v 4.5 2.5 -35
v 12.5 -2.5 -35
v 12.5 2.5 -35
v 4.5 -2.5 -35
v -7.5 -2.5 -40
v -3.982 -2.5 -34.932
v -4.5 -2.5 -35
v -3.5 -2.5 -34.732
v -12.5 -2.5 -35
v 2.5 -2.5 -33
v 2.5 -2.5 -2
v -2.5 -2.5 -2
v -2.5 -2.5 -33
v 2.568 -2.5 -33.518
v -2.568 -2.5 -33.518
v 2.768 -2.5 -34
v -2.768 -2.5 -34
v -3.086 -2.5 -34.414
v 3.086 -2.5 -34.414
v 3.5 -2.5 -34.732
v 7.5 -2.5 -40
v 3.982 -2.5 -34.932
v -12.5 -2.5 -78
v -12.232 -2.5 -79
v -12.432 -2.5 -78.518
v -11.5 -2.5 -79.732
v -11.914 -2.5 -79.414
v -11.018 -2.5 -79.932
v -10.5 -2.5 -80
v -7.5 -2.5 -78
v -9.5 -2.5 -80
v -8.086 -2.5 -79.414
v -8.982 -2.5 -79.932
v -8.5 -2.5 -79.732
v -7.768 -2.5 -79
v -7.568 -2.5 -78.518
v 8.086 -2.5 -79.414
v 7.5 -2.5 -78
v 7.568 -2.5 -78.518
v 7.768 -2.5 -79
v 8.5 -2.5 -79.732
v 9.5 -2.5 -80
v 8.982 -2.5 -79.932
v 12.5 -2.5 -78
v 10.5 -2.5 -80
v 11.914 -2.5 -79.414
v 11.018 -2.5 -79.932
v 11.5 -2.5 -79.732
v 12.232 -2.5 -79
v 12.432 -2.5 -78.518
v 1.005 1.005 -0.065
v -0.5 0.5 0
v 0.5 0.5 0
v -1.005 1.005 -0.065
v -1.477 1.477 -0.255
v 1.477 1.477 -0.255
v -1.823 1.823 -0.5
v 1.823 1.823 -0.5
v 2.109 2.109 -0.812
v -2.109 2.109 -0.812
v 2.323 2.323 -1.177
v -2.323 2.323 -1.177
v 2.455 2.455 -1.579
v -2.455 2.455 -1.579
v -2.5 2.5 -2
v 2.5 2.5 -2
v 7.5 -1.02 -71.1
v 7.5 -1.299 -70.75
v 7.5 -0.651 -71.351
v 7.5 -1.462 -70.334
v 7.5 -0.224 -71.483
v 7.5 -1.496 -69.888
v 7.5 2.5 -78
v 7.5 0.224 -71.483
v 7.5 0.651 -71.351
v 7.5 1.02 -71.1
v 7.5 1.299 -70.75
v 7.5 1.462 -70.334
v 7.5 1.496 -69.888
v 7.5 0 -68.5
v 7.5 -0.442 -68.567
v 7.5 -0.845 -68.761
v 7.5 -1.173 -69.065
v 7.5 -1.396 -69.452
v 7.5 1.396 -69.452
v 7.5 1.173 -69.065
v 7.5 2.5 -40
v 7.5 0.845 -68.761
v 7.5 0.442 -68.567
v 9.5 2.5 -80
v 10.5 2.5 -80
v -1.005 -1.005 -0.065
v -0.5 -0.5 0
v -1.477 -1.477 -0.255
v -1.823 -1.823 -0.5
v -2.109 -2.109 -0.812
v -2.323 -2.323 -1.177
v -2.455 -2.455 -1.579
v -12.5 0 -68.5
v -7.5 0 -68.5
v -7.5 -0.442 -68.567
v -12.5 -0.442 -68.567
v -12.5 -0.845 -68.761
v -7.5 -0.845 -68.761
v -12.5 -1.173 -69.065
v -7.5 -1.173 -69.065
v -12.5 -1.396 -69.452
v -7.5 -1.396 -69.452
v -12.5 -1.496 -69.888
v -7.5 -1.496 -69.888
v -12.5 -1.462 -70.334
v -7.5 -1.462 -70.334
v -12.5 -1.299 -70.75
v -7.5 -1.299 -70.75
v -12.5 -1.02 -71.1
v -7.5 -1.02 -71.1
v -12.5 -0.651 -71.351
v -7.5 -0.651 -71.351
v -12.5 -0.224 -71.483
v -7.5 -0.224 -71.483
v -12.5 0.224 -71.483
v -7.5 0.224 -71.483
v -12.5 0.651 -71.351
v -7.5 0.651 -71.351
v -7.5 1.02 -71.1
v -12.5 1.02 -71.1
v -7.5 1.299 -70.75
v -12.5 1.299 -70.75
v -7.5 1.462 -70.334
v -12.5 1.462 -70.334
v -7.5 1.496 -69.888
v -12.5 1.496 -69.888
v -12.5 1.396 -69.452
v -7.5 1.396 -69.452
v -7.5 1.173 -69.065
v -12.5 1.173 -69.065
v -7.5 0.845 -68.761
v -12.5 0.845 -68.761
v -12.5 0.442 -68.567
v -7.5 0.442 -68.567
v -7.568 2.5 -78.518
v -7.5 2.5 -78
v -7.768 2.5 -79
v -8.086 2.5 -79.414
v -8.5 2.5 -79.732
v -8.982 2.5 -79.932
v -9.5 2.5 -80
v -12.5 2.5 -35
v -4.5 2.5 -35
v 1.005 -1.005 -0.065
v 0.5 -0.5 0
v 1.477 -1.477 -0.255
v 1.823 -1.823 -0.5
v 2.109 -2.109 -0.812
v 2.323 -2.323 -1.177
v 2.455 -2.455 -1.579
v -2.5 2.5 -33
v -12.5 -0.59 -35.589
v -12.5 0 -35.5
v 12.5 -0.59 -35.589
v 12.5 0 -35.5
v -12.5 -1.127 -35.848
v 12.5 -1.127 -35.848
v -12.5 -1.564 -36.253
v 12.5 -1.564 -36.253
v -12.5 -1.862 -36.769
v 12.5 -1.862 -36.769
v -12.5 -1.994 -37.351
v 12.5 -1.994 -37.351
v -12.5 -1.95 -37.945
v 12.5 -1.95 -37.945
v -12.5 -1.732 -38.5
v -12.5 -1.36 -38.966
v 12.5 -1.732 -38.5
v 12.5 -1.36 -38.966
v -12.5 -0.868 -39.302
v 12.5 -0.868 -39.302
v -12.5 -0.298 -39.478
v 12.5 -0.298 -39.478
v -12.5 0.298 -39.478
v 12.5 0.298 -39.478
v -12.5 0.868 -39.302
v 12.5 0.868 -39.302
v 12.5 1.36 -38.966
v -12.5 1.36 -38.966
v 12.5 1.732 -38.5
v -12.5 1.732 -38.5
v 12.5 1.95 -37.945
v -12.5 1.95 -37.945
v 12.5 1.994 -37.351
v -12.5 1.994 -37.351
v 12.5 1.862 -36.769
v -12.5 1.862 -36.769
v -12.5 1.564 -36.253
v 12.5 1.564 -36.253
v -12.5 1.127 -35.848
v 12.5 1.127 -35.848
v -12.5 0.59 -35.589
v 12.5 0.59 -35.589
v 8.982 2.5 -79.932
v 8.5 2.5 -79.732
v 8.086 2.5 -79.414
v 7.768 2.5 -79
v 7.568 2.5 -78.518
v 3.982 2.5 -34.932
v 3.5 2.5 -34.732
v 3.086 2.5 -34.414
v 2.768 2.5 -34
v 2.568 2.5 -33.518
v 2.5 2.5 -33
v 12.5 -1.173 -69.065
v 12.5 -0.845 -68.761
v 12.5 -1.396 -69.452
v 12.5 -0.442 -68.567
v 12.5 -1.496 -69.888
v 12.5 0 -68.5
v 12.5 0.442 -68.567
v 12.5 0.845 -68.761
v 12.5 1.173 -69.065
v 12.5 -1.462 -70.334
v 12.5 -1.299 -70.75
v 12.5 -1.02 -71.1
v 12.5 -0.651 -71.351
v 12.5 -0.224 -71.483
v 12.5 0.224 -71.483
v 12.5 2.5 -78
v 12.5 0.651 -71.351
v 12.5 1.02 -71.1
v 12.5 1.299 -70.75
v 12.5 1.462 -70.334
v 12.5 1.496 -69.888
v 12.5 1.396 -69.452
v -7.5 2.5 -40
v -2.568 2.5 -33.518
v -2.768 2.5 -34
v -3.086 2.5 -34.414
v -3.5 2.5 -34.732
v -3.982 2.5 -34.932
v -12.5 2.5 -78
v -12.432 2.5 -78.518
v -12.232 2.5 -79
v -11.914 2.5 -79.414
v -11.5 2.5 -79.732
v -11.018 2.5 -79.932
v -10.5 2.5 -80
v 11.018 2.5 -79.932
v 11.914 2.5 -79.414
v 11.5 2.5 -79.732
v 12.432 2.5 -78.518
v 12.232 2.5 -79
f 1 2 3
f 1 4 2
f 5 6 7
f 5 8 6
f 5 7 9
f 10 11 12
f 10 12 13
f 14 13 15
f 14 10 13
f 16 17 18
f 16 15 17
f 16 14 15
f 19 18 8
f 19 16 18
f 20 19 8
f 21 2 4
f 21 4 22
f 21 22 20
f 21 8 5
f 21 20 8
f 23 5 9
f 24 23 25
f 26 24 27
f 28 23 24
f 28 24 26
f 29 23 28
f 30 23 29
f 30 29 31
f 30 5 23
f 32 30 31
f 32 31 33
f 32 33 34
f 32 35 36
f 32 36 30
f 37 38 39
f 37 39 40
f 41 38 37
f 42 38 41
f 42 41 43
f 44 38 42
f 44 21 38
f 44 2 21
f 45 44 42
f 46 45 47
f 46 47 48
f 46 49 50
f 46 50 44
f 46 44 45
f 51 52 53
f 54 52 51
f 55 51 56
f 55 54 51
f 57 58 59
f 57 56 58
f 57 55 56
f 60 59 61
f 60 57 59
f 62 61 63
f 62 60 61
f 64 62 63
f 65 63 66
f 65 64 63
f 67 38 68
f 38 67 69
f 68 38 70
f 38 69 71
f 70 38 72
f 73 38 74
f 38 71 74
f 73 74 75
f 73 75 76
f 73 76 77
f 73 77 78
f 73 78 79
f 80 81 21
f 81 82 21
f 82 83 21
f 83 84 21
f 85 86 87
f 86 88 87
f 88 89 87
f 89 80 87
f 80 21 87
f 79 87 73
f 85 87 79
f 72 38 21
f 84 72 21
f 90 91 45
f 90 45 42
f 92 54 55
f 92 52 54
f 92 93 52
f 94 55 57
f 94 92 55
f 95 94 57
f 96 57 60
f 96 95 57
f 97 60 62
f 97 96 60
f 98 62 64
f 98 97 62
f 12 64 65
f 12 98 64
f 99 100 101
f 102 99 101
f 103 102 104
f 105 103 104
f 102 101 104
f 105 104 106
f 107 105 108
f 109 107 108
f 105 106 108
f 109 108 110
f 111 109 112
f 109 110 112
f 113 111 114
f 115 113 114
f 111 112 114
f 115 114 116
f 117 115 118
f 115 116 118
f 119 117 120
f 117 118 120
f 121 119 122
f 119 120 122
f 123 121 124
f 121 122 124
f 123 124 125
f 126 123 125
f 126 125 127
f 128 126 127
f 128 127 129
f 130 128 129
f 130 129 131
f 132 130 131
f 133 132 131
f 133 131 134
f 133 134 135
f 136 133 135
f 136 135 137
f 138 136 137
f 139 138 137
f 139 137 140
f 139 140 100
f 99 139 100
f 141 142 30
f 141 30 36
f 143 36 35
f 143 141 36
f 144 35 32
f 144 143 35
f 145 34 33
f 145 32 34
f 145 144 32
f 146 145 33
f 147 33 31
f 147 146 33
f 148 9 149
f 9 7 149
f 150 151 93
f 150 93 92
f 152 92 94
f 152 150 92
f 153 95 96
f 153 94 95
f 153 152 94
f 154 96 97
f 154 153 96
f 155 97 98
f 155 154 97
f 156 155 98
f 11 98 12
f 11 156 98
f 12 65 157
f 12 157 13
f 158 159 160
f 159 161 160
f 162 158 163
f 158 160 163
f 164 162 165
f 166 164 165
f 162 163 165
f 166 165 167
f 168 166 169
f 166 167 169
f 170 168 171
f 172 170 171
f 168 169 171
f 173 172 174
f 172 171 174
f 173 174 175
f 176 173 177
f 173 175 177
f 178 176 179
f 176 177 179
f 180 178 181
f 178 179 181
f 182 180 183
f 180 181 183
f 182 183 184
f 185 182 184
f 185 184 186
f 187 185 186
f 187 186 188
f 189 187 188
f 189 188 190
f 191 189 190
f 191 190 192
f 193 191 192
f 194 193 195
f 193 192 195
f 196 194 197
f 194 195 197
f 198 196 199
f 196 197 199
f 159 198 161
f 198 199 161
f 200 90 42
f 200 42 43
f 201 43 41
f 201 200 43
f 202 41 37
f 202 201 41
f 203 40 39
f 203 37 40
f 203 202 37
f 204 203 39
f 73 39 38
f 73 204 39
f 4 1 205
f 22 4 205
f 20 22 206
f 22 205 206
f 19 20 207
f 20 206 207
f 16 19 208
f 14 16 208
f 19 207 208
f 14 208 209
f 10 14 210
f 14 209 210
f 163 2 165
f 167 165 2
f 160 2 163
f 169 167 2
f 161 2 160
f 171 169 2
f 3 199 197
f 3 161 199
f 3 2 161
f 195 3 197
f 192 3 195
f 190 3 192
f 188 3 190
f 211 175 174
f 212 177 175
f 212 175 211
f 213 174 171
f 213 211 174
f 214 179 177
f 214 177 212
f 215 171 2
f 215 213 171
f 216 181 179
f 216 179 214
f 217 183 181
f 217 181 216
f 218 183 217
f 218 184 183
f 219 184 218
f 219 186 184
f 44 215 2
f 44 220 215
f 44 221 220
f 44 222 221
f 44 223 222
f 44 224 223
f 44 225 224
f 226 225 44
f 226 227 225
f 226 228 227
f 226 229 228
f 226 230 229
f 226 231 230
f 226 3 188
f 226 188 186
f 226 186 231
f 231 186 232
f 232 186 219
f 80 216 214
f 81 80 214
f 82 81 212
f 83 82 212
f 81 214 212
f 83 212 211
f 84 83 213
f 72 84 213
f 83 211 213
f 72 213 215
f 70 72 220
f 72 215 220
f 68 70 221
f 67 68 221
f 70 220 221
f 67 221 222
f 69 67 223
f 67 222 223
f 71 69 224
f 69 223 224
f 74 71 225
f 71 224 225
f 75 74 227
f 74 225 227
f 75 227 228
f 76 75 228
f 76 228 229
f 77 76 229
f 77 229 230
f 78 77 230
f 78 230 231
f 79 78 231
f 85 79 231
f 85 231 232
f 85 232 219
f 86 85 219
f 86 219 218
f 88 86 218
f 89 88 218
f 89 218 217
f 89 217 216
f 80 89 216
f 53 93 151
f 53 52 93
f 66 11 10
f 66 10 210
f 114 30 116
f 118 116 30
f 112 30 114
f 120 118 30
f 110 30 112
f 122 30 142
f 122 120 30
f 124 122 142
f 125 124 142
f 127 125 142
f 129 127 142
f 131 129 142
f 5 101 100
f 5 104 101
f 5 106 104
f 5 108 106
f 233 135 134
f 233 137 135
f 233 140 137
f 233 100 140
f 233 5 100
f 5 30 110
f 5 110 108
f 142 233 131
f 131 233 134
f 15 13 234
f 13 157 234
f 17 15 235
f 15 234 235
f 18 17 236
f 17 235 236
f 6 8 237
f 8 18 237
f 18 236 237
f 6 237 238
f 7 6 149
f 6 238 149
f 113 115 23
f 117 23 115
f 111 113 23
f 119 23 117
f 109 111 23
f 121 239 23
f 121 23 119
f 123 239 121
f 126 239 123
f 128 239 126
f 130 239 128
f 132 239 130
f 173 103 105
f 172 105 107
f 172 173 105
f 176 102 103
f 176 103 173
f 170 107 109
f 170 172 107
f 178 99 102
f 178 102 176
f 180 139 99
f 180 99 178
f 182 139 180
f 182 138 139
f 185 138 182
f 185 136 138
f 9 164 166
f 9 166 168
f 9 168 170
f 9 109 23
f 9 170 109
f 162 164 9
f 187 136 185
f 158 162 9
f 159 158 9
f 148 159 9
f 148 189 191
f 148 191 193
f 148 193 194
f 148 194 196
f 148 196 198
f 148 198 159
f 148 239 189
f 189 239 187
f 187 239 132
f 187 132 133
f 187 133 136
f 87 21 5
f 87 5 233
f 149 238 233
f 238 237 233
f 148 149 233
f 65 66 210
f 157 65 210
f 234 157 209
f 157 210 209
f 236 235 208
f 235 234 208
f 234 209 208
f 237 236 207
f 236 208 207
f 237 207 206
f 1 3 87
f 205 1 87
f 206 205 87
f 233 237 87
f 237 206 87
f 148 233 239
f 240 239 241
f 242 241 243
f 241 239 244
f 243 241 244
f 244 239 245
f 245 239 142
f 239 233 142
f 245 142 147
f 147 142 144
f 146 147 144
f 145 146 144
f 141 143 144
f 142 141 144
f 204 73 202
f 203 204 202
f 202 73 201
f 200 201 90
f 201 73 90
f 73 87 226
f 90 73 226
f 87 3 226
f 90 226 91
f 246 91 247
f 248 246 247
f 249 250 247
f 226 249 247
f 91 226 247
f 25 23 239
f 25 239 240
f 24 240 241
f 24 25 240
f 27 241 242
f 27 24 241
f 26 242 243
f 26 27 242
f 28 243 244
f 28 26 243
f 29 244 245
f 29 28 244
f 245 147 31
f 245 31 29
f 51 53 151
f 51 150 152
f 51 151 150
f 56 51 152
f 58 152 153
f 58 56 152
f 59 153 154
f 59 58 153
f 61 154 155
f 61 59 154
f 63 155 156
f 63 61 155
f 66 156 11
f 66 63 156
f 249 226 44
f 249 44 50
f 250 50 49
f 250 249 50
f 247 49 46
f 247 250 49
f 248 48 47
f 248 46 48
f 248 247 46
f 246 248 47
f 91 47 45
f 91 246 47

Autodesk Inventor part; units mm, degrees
ref_plane "YZ Plane" through (0, 0, 0) normal (1, 0, 0) x (0, 1, 0)
ref_plane "XZ Plane" through (0, 0, 0) normal (0, 1, 0) x (-1, 0, 0)
ref_plane "XY Plane" through (0, 0, 0) normal (0, 0, 1) x (1, 0, 0)
sketch "Skizze1" plane through (0, 0, 0) normal (0, 0, 1) x (1, 0, 0)
  line L0 (-2.5, -2.5) -> (2.5, -2.5)
  line L1 (2.5, -2.5) -> (2.5, 2.5)
  line L2 (2.5, 2.5) -> (-2.5, 2.5)
  line L3 (-2.5, 2.5) -> (-2.5, -2.5)
  line L4 (-2.5, -2.5) -> (2.5, 2.5) construction
  line L5 (2.5, -2.5) -> (-2.5, 2.5) construction
  point P0 (0, 0)
  dimension "d0" = 5
  dimension "d1" = 5
extrude "Extrusion1" add sketch "Skizze1" against normal blind 40
sketch "Skizze3" plane through (-2.5, -2.5, 0) normal (-1, 0, 0) x (0, 0, 1)
  line L0 (0, 5) -> (-40, 5) projected
  line L1 (-40, 0) -> (-40, 5) projected
  line L2 (0, 0) -> (-40, 0) projected
  line L3 (-35, 5) -> (-40, 5)
  line L4 (-40, 5) -> (-40, 0)
  line L5 (-40, 0) -> (-35, 0)
  line L6 (-35, 0) -> (-35, 5)
  line L7 (-35, 5) -> (-40, 0) construction
  line L8 (-40, 5) -> (-35, 0) construction
  point P0 (0, 2.5)
  point P1 (-37.5, 2.5)
  point P2 (-40, 2.5)
  point P3 (-35, 0)
  point P4 (-35, 5)
  dimension "d14" = 5
  dimension "d15" = 5
sketch "Skizze4" plane through (2.5, -2.5, 0) normal (1, 0, 0) x (0, 0, -1)
  line L0 (0, 0) -> (40, 0) projected
  line L1 (40, 5) -> (40, 0) projected
  line L2 (0, 5) -> (40, 5) projected
  line L3 (35, 5) -> (40, 5)
  line L4 (40, 5) -> (40, 0)
  line L5 (40, 0) -> (35, 0)
  line L6 (35, 0) -> (35, 5)
  line L7 (35, 5) -> (40, 0) construction
  line L8 (40, 5) -> (35, 0) construction
  point P0 (0, 2.5)
  point P1 (37.5, 2.5)
  point P2 (40, 2.5)
  point P3 (35, 5)
  point P4 (35, 0)
  dimension "d16" = 5
  dimension "d17" = 5
extrude "Extrusion2" add sketch "Skizze4" along normal blind 10
extrude "Extrusion3" add sketch "Skizze3" along normal blind 10
sketch "Skizze5" plane through (0, 0, -40) normal (0, 0, -1) x (-1, 0, 0)
  line L0 (12.5, -2.5) -> (-12.5, -2.5) projected
  line L1 (12.5, 2.5) -> (12.5, -2.5) projected
  line L2 (-12.5, 2.5) -> (12.5, 2.5) projected
  line L3 (-12.5, -2.5) -> (-12.5, 2.5) projected
  line L4 (12.5, -2.5) -> (7.5, -2.5)
  line L5 (7.5, -2.5) -> (7.5, 2.5)
  line L6 (7.5, 2.5) -> (12.5, 2.5)
  line L7 (12.5, 2.5) -> (12.5, -2.5)
  line L8 (12.5, -2.5) -> (7.5, 2.5) construction
  line L9 (7.5, -2.5) -> (12.5, 2.5) construction
  line L10 (-7.5, 2.5) -> (-12.5, 2.5)
  line L11 (-12.5, 2.5) -> (-12.5, -2.5)
  line L12 (-12.5, -2.5) -> (-7.5, -2.5)
  line L13 (-7.5, -2.5) -> (-7.5, 2.5)
  line L14 (-7.5, 2.5) -> (-12.5, -2.5) construction
  line L15 (-12.5, 2.5) -> (-7.5, -2.5) construction
  point P0 (0, 0)
  point P1 (10, 0)
  point P2 (-10, 0)
  point P3 (12.5, 0)
  point P4 (-12.5, 0)
  point P5 (7.5, 2.5)
  dimension "d22" = 5
  dimension "d23" = 5
  dimension "d24" = 5
  dimension "d25" = 5
extrude "Extrusion4" add sketch "Skizze5" along normal blind 40 contours L0 L5 L2 L1 | L0 L3 L2 L13
sketch "Skizze6" plane through (-12.5, -2.5, 0) normal (-1, 0, 0) x (0, 0, 1)
  line L0 (-80, 0) -> (-80, 5) projected
  line L1 (-35, 0) -> (-80, 0) projected
  point P0 (0, 2.5)
  point P1 (-70, 2.5)
  point P2 (-80, 2.5)
  dimension "d35" = 10
  dimension "d36" = 2.5
hole "Bohrung2" at (-12.5, 0, -70) direction (1, 0, 0) diameter 3 end through all
sketch "Skizze7" plane through (12.5, -2.5, 0) normal (1, 0, 0) x (0, 0, -1)
  circle A0 centre (70, 2.5) radius 1.5 projected
  line L0 (35, 0) -> (80, 0) projected
  line L1 (80, 5) -> (80, 0) projected
  line L2 (35, 5) -> (80, 5) projected
  line L3 (35, 5) -> (35, 0) projected
  point P0 (0, 2.5)
sketch "Skizze8" plane through (-12.5, -2.5, 0) normal (-1, 0, 0) x (0, 0, 1)
  line L0 (-35, 0) -> (-80, 0) projected
  line L1 (-35, 0) -> (-35, 5) projected
  point P0 (0, 2.5)
  point P1 (-37.5, 2.5)
  dimension "d44" = 2.5
  dimension "d45" = 2.5
hole "Bohrung1" at (-12.5, 0, -37.5) direction (1, 0, 0) diameter 4 end through all
fillet "Rundung1" radius 2 10 edges at (-7.5, 0, -80) (7.5, 0, -80) (-12.5, 0, -80) (12.5, 0, -80) (2.5, 0, 0) (-2.5, 0, 0) (0, 2.5, 0) (0, -2.5, 0) (-2.5, 0, -35) (2.5, 0, -35)
properties part number "Hebel"
